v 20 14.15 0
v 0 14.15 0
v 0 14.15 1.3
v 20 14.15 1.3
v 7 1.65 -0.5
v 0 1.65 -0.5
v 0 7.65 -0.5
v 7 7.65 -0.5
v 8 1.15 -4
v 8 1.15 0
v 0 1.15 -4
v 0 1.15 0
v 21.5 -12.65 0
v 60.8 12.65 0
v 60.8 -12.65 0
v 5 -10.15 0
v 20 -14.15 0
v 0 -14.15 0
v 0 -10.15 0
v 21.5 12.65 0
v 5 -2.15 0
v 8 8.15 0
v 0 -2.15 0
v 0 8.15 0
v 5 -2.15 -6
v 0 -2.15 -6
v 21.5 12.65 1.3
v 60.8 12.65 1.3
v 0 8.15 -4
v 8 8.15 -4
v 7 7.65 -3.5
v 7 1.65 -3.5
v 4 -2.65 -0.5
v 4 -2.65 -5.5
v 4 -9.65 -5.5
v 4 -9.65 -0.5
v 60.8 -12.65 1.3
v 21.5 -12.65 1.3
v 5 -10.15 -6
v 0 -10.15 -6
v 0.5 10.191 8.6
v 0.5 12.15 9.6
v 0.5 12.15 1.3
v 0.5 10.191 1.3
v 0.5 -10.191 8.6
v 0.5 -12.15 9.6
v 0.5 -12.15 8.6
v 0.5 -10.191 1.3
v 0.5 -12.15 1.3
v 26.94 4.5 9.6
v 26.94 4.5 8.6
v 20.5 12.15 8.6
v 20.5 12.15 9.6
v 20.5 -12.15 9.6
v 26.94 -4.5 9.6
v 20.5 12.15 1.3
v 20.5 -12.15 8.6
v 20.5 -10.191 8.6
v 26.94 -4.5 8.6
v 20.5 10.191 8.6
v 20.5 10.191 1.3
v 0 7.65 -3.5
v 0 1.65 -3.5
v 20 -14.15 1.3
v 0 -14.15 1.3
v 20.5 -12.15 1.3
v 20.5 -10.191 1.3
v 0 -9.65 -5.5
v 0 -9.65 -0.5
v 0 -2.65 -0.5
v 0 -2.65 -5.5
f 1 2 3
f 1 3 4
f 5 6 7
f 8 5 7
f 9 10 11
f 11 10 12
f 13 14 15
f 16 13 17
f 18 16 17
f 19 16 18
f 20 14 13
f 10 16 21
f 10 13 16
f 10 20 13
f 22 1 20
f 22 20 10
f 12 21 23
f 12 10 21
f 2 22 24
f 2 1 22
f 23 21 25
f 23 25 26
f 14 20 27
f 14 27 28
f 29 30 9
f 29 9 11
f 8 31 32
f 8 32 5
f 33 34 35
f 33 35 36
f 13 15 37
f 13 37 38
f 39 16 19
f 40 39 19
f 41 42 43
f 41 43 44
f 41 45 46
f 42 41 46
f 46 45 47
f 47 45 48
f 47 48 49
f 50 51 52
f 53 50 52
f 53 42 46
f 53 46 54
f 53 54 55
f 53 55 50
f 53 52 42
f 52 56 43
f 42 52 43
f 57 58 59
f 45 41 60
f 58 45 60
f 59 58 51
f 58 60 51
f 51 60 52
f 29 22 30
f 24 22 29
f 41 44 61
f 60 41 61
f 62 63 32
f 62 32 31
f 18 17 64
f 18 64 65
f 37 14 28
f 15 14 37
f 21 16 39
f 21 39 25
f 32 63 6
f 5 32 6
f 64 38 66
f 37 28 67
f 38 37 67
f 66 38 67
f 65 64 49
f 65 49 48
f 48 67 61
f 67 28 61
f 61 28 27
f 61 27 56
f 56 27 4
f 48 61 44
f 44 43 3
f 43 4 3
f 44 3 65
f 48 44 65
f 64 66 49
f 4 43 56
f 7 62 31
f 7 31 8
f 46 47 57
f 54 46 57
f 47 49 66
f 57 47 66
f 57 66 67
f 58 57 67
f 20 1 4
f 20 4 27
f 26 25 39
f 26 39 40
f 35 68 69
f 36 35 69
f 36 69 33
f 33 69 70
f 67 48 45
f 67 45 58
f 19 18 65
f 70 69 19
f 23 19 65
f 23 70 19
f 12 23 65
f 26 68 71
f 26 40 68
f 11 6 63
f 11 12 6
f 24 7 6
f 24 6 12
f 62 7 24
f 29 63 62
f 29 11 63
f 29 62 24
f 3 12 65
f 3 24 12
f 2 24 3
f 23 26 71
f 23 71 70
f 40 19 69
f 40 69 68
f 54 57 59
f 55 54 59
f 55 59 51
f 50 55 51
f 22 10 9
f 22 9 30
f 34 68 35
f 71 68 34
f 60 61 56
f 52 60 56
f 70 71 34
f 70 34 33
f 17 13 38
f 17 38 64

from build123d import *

# Parameters (mm, degrees)
BOSS_EXTRU_1_DEPTH      = 1.3
ESQUISSE2_W             = 8
ESQUISSE2_H             = 7
BOSS_EXTRU_3_DEPTH      = 4
ESQUISSE5_W             = 5
ESQUISSE5_H             = 8
BOSS_EXTRU_4_DEPTH      = 6
ESQUISSE6_W             = 3
ESQUISSE6_H             = 6
ENL_V_MAT_EXTRU_1_DEPTH = 7
ESQUISSE7_W             = 5
ESQUISSE7_H             = 7
ENL_V_MAT_EXTRU_2_DEPTH = 4
ESQUISSE8_W             = 20
ESQUISSE8_H             = 1.959214555
BOSS_EXTRU_5_DEPTH      = 7.3
BOSS_EXTRU_6_DEPTH      = 1


with BuildPart() as part:
    # Esquisse1 → Boss.-Extru.1 (new body)
    with BuildSketch(Plane.XY):
        Polygon((0, -14.15), (0, 14.15), (20, 14.15), (21.5, 12.65), (60.8, 12.65), (60.8, -12.65), (21.5, -12.65), (20, -14.15), align=None)
    extrude(amount=BOSS_EXTRU_1_DEPTH)

    # Esquisse2 → Boss.-Extru.3 (add)
    with BuildSketch(Plane(origin=(0, 0, 0), x_dir=(-1, 0, 0), z_dir=(0, 0, -1))):
        with Locations((-4, 4.65)):
            Rectangle(ESQUISSE2_W, ESQUISSE2_H)
    extrude(amount=BOSS_EXTRU_3_DEPTH)

    # Esquisse5 → Boss.-Extru.4 (add)
    with BuildSketch(Plane(origin=(0, 0, 0), x_dir=(-1, 0, 0), z_dir=(0, 0, -1))):
        with Locations((-2.5, -6.15)):
            Rectangle(ESQUISSE5_W, ESQUISSE5_H)
    extrude(amount=BOSS_EXTRU_4_DEPTH)

    # Esquisse6 → Enlèv. mat.-Extru.1 (cut)
    with BuildSketch(Plane.ZY):
        with Locations((-2, 4.65)):
            Rectangle(ESQUISSE6_W, ESQUISSE6_H)
    extrude(amount=-ENL_V_MAT_EXTRU_1_DEPTH, mode=Mode.SUBTRACT)

    # Esquisse7 → Enlèv. mat.-Extru.2 (cut)
    with BuildSketch(Plane.ZY):
        with Locations((-3, -6.15)):
            Rectangle(ESQUISSE7_W, ESQUISSE7_H)
    extrude(amount=-ENL_V_MAT_EXTRU_2_DEPTH, mode=Mode.SUBTRACT)

    # Esquisse8 → Boss.-Extru.5 (add)
    with BuildSketch(Plane.XY.offset(1.3)):
        with Locations((10.5, 11.170392723)):
            Rectangle(ESQUISSE8_W, ESQUISSE8_H)
        with Locations((10.5, -11.170392723)):
            Rectangle(ESQUISSE8_W, ESQUISSE8_H)
    extrude(amount=BOSS_EXTRU_5_DEPTH)

    # Esquisse10 → Boss.-Extru.6 (add)
    with BuildSketch(Plane.XY.offset(8.6)):
        Polygon((0.5, 12.15), (0.5, -12.15), (20.5, -12.15), (26.940302788, -4.5), (26.940302788, 4.5), (20.5, 12.15), align=None)
    extrude(amount=BOSS_EXTRU_6_DEPTH)


solid = part.part
